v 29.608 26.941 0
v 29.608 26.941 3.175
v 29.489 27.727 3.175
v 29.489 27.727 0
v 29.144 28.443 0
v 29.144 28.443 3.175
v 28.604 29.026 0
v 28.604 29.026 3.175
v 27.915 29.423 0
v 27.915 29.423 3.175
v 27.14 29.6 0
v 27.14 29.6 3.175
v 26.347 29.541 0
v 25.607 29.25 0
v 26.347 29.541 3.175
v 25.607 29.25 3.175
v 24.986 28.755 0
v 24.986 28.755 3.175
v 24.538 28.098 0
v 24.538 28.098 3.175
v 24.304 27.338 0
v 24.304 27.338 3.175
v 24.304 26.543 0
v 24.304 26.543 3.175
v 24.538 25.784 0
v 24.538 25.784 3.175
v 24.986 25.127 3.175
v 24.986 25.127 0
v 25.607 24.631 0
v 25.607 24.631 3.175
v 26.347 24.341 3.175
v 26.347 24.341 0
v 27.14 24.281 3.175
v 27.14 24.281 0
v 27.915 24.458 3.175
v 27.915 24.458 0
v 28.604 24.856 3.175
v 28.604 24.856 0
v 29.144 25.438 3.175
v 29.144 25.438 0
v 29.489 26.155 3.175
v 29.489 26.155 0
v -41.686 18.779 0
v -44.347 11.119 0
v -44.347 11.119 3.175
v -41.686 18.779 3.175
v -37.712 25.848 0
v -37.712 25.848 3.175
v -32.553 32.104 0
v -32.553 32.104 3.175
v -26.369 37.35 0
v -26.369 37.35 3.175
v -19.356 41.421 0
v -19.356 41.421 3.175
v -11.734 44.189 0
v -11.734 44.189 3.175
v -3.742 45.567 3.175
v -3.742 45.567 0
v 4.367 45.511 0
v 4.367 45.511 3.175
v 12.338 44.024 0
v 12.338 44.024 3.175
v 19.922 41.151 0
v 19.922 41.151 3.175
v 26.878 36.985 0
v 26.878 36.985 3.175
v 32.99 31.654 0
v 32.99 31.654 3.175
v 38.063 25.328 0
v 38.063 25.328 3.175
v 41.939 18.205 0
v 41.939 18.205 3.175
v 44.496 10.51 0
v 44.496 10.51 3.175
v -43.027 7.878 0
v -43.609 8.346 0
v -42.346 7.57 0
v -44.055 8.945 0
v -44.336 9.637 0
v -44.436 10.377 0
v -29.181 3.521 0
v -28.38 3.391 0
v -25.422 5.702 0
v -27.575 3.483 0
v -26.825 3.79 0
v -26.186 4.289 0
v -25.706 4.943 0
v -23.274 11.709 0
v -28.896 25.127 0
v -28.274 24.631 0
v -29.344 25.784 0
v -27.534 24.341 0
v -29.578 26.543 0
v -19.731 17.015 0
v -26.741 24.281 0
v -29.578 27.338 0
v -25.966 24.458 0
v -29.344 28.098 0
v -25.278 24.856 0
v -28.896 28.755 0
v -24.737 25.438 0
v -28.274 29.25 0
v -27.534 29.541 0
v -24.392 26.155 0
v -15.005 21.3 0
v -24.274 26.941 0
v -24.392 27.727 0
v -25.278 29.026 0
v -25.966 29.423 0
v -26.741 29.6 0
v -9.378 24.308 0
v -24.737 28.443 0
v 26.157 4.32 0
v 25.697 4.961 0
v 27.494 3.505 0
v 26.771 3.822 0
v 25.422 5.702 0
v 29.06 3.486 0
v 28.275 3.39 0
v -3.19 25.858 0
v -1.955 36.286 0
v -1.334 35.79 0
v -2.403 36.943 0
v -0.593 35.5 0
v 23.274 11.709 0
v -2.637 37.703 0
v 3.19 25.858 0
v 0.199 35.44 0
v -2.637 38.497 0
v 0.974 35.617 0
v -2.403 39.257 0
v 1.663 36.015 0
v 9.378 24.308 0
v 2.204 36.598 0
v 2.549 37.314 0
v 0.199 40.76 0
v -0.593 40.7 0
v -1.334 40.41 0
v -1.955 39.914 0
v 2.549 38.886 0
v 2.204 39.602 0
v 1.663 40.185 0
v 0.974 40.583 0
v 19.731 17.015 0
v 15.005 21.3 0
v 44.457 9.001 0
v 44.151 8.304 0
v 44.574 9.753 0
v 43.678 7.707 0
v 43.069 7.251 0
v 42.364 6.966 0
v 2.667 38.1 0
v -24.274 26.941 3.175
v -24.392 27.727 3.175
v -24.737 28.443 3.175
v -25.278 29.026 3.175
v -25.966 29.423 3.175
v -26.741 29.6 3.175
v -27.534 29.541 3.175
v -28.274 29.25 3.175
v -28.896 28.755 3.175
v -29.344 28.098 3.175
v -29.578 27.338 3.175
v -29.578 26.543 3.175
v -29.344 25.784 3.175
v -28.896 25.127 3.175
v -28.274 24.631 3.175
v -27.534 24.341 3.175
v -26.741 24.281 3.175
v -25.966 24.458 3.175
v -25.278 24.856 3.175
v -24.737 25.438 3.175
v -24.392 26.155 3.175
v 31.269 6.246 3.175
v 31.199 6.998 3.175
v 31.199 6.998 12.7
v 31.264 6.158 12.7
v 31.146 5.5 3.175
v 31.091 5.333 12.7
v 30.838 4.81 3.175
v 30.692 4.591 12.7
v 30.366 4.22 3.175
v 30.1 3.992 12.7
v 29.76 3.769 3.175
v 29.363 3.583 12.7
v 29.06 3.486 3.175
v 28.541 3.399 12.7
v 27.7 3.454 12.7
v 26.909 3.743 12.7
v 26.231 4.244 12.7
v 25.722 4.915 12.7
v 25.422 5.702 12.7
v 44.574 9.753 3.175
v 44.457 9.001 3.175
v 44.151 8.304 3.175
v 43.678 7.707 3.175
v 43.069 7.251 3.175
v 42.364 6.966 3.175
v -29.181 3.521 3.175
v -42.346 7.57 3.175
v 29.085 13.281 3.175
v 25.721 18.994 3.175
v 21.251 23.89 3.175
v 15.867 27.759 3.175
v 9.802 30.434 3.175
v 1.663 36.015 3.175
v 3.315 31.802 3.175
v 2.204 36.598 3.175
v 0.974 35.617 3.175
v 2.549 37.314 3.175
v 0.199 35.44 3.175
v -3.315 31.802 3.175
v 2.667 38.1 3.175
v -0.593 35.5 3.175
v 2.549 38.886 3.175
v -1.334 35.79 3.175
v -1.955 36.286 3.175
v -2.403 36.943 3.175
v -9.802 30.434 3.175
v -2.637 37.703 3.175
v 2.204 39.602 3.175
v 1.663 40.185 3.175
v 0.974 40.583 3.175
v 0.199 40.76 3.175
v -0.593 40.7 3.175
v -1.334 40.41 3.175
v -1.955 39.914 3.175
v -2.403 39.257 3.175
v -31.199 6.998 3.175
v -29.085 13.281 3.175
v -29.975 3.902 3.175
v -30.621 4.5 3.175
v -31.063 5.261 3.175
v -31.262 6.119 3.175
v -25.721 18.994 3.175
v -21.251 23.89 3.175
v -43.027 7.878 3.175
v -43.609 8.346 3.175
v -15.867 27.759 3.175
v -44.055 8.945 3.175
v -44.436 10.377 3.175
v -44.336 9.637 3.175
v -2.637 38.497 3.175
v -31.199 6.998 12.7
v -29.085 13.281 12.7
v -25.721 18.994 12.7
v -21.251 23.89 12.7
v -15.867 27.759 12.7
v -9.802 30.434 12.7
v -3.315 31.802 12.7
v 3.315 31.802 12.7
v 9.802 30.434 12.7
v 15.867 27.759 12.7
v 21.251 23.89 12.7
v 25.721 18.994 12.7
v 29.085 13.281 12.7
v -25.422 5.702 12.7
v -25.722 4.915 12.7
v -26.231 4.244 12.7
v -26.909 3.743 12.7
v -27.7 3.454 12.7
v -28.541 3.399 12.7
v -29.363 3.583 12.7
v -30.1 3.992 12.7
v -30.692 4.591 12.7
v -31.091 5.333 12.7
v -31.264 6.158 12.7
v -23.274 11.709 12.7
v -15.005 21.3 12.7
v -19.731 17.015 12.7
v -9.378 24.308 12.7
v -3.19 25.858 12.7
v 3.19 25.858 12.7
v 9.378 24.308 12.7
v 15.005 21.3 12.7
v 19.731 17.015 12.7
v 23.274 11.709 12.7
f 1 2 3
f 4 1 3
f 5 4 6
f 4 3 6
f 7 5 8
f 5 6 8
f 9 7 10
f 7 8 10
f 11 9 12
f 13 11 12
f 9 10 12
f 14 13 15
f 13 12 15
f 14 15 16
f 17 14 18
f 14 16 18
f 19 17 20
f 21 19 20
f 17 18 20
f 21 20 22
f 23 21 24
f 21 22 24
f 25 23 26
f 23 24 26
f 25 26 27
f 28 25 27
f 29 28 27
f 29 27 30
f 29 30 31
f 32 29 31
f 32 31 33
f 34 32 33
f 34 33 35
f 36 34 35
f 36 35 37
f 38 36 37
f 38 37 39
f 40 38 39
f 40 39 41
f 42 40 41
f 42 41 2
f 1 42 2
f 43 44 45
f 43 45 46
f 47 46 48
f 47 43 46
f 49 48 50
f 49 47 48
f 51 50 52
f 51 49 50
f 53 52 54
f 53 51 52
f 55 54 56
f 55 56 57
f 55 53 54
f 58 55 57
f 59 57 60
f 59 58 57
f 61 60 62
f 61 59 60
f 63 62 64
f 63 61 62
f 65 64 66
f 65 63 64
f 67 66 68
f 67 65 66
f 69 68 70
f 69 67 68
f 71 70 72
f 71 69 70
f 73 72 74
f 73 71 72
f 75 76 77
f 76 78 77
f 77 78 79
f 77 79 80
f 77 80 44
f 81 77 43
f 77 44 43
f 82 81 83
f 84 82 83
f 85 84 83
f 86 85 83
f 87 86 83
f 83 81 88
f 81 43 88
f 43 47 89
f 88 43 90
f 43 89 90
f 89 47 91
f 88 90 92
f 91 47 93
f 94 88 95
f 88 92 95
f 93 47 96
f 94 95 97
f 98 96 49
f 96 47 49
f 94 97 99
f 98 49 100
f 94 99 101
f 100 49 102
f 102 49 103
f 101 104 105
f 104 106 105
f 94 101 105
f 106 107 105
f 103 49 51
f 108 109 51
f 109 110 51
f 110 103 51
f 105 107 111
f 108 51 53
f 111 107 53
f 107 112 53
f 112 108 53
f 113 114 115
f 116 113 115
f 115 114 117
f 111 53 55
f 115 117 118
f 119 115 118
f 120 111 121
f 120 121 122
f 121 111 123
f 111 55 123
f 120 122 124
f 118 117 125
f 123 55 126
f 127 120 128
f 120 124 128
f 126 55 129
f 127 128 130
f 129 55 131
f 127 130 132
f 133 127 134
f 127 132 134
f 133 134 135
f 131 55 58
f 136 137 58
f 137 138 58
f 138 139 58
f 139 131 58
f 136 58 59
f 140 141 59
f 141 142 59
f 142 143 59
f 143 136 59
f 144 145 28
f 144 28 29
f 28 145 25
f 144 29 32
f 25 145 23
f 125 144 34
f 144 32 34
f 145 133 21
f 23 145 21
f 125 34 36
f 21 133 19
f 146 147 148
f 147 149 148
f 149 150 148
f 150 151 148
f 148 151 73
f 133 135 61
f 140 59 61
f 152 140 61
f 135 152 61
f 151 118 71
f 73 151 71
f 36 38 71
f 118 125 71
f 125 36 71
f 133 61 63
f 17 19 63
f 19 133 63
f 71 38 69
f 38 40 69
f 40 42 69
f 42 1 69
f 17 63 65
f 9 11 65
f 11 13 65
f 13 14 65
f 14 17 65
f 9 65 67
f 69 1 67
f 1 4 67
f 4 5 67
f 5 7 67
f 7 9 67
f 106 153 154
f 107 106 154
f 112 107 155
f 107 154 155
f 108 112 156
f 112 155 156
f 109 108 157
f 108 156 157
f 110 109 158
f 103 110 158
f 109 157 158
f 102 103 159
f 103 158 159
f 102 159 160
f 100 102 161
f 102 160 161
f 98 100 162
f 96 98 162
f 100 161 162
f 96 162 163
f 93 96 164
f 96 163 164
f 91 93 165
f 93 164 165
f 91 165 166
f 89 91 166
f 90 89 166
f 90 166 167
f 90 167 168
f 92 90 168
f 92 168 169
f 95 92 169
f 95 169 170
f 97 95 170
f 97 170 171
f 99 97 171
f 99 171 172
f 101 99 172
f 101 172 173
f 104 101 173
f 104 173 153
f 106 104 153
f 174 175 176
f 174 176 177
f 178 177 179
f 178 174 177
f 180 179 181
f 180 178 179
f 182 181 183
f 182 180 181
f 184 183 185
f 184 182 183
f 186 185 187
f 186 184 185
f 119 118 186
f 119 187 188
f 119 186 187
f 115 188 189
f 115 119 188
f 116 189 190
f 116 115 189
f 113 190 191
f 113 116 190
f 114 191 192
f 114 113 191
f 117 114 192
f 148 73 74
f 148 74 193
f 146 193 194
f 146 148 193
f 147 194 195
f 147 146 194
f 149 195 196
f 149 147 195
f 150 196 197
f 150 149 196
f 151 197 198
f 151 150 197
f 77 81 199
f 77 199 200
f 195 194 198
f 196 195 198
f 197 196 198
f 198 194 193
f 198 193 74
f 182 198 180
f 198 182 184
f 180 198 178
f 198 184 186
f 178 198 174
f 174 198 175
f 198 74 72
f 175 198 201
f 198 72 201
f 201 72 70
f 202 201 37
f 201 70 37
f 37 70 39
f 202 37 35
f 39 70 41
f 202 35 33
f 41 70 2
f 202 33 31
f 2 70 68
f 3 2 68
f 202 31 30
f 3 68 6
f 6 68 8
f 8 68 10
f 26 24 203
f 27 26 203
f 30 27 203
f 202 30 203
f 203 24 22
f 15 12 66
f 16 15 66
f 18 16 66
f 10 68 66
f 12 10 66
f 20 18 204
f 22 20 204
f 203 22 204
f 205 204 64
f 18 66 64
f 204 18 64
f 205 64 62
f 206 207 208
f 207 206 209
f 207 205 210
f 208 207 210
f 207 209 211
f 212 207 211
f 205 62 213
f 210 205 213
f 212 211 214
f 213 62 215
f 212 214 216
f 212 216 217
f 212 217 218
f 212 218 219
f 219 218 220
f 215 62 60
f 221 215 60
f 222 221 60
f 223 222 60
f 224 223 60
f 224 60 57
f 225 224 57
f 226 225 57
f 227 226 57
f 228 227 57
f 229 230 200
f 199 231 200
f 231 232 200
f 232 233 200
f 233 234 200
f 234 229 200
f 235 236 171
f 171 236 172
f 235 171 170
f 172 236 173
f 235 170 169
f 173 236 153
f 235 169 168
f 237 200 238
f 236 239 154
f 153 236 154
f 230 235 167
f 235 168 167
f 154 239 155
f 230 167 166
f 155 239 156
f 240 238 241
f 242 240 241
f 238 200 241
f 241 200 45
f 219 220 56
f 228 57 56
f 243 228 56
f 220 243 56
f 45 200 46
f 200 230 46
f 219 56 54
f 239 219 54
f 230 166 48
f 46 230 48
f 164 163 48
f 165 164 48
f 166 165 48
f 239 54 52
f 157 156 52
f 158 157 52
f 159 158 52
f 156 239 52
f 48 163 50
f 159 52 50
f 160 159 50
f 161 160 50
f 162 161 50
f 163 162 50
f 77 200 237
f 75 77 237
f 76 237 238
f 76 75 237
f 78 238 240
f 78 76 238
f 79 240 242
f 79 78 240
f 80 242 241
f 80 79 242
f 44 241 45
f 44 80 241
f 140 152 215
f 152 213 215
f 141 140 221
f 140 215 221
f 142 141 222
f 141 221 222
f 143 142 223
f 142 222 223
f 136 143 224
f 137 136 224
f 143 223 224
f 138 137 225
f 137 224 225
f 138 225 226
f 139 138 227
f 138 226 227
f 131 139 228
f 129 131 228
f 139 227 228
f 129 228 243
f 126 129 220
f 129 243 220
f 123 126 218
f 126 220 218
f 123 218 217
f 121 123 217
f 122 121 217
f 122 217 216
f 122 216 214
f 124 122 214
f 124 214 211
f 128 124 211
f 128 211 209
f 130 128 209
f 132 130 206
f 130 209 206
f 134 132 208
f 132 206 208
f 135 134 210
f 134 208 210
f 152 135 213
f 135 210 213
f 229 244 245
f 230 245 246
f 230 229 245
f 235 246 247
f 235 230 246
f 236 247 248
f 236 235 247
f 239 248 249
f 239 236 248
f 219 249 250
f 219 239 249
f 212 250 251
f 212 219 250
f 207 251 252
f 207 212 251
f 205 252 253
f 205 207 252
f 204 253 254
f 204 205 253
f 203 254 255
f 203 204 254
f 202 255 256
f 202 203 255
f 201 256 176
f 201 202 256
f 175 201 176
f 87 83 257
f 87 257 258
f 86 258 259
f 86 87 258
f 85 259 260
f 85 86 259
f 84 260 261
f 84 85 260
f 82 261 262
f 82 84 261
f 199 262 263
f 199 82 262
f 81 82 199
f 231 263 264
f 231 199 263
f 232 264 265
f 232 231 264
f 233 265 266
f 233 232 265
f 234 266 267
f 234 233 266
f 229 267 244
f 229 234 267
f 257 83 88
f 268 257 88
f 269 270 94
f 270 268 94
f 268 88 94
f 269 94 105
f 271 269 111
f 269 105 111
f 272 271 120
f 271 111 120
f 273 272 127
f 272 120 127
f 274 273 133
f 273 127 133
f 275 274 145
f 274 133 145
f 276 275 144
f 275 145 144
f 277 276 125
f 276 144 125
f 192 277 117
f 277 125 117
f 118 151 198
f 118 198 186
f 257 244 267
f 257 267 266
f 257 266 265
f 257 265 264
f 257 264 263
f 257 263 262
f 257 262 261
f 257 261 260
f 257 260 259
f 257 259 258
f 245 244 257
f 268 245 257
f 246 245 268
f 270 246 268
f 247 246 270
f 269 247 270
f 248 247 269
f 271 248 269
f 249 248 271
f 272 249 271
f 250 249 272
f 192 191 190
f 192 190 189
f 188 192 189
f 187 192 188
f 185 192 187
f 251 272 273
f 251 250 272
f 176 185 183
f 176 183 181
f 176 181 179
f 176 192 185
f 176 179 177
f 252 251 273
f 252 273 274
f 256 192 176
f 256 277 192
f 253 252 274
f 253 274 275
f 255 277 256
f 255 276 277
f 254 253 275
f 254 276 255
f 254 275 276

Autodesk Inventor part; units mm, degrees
ref_plane "YZ Plane" through (0, 0, 0) normal (1, 0, 0) x (0, 1, 0)
ref_plane "XZ Plane" through (0, 0, 0) normal (0, 1, 0) x (-1, 0, 0)
ref_plane "XY Plane" through (0, 0, 0) normal (0, 0, 1) x (1, 0, 0)
sketch "Sketch1" plane through (0, 0, 0) normal (0, 0, 1) x (1, 0, 0)
  arc A0 (28.3106, 6.35) -> (-28.3106, 6.35) centre (0, 0) ccw construction
  arc A1 (31.1988, 6.9978) -> (-31.1988, 6.9978) centre (0, 0) ccw
  arc A2 (25.4224, 5.7022) -> (-25.4224, 5.7022) centre (0, 0) ccw
  arc A3 (25.4224, 5.7022) -> (31.1988, 6.9978) centre (28.3106, 6.35) ccw
  arc A4 (-31.1988, 6.9978) -> (-25.4224, 5.7022) centre (-28.3106, 6.35) ccw
  dimension "d0" = 2.96
  dimension "d1" = 26.054
  dimension "d2" = 6.35
  dimension "d5" = 31.974
extrude "Extrusion1" add sketch "Sketch1" along normal blind 12.7
sketch "Sketch2" plane through (0, 0, 0) normal (0, 0, -1) x (-1, 0, 0)
  arc A0 (31.1988, 6.9978) -> (-31.1988, 6.9978) centre (0, 0) ccw projected
  arc A1 (44.3474, 11.1189) -> (-44.4956, 10.5098) centre (0, 0) ccw
  arc A2 (-44.4956, 10.5098) -> (-42.3638, 6.9657) centre (-41.6149, 9.8294) ccw
  line L0 (-42.3638, 6.9657) -> (-29.0595, 3.4863)
  arc A3 (-31.1988, 6.9978) -> (-25.4224, 5.7022) centre (-28.3106, 6.35) ccw projected
  arc A4 (25.4224, 5.7022) -> (31.1988, 6.9978) centre (28.3106, 6.35) ccw projected
  line L1 (29.1807, 3.5208) -> (42.3463, 7.5698)
  arc A5 (42.3463, 7.5698) -> (44.3474, 11.1189) centre (41.4762, 10.3991) ccw
  arc A6 (-31.1988, 6.9978) -> (-25.4224, 5.7022) centre (-28.3106, 6.35) ccw projected
  dimension "d6" = 45.72
extrude "Extrusion2" add sketch "Sketch2" against normal blind 3.175
sketch "Sketch3" plane through (0, 0, 3.175) normal (0, 0, 1) x (1, 0, 0)
  circle A0 centre (-26.9408, 26.9408) radius 2.667
  line L0 (0, 0) -> (0, 4.8755)
  circle A1 centre (0, 38.1) radius 2.667
  circle A2 centre (26.9408, 26.9408) radius 2.667
  dimension "d9" = 5.334
  dimension "d10" = 38.1
  dimension "d11" = 45
  dimension "d14" = 90
extrude "Extrusion3" cut sketch "Sketch3" against normal through all
properties part number "HoseClampShaftCollarShooterMount"
